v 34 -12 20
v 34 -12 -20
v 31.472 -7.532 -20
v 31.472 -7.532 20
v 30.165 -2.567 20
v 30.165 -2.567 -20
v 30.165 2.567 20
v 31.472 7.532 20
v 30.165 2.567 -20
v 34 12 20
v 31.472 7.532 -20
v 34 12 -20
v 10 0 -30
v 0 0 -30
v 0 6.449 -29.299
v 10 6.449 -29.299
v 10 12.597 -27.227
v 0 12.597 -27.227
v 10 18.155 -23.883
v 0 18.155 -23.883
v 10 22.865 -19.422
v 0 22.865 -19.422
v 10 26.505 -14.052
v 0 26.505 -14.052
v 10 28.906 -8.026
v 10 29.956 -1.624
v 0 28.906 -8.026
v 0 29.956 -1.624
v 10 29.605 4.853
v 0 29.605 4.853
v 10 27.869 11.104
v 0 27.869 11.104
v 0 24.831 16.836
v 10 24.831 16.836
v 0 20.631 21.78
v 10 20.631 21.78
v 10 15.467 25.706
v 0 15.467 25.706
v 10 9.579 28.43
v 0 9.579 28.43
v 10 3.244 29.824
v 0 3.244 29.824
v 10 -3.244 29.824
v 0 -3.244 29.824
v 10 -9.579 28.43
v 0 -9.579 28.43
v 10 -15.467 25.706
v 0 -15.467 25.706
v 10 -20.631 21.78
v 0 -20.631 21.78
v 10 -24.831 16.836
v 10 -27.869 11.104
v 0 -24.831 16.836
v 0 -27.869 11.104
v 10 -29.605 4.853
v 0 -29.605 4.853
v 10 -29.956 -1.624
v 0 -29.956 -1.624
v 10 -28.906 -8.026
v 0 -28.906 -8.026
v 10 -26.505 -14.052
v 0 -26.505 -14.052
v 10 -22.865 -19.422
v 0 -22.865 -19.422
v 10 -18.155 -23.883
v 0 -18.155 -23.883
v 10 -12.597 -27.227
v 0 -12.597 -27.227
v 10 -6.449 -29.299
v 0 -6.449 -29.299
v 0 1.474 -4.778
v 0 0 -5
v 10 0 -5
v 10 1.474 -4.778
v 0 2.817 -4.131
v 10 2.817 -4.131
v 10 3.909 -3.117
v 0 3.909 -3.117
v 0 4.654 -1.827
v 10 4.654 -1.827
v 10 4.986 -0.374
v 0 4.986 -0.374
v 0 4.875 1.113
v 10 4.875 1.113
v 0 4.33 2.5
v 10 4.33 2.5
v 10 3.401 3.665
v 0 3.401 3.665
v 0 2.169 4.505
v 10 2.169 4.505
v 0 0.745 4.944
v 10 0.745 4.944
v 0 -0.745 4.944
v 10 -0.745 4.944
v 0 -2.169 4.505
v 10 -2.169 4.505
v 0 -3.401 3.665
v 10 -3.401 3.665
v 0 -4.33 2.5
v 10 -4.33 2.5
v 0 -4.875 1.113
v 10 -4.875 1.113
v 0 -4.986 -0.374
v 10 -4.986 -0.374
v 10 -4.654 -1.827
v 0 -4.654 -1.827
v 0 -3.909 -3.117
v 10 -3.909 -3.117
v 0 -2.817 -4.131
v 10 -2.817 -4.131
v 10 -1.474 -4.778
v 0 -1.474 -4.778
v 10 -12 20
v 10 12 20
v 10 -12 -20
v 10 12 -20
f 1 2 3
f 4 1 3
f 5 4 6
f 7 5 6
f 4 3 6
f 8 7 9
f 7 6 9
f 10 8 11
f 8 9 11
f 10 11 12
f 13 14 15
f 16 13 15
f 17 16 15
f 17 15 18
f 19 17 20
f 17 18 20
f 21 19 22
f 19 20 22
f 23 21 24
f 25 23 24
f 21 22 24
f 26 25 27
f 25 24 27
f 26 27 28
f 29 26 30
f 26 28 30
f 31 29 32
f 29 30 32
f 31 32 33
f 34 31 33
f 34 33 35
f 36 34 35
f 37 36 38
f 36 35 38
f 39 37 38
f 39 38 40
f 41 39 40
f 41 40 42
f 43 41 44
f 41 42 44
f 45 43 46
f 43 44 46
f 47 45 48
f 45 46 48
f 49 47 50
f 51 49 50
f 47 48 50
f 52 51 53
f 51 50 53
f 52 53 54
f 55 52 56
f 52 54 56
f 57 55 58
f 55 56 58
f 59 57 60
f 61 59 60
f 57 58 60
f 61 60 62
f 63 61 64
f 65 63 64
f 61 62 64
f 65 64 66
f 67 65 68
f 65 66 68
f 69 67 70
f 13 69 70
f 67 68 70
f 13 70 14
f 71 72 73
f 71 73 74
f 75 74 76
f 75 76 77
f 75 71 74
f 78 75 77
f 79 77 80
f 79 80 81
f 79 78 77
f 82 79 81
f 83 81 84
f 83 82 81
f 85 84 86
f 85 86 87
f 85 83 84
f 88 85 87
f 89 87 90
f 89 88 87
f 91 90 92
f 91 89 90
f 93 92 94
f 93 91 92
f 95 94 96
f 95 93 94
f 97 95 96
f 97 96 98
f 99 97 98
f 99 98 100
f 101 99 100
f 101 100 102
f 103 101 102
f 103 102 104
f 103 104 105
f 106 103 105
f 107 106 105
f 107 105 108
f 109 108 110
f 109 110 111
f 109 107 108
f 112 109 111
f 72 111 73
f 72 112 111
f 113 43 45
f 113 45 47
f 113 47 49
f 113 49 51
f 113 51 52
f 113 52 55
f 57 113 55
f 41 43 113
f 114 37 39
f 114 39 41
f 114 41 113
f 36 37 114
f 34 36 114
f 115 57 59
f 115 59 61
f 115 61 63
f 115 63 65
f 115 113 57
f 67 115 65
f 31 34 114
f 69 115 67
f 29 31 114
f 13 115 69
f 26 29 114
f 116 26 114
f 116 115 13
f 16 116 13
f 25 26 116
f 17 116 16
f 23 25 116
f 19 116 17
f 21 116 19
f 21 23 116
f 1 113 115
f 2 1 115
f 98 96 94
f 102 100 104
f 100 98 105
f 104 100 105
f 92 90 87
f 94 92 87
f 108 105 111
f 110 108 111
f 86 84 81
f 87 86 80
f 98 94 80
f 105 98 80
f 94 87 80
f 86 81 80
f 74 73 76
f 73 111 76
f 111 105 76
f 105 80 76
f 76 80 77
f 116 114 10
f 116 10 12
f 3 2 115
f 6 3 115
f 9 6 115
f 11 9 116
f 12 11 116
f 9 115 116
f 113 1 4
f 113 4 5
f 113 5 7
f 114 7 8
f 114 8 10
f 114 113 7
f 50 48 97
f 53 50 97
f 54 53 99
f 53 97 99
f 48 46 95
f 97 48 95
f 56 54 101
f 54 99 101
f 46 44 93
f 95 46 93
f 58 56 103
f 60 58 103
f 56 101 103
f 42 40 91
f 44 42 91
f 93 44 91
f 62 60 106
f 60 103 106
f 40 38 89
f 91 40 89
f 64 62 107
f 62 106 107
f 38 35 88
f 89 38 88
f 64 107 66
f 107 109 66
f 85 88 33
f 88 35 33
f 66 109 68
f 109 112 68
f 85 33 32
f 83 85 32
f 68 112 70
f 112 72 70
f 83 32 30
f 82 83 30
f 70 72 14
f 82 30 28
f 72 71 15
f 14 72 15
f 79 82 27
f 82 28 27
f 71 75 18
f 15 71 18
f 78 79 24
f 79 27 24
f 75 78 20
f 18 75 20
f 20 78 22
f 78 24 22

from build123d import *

# Parameters (mm, degrees)
SKETCH_1_R          = 30
SKETCH_1_R_2        = 5
EXTRUDE_1_DEPTH     = 10
SKETCH_3_W          = 40
SKETCH_3_H          = 24
EXTRUDE_2_DEPTH     = 30
SKETCH_4_R          = 20
CUT_EXTRUDE_2_DEPTH = 71.710678119


with BuildPart() as part:
    # 草图1 → 凸台-拉伸1 (new body)
    with BuildSketch(Plane(origin=(0, 0, 0), x_dir=(0, 0, -1), z_dir=(1, 0, 0))):
        Circle(SKETCH_1_R)
        Circle(SKETCH_1_R_2, mode=Mode.SUBTRACT)
    extrude(amount=EXTRUDE_1_DEPTH)

    # 草图3 → 凸台-拉伸2 (add)
    with BuildSketch(Plane(origin=(10, 0, 0), x_dir=(0, 0, -1), z_dir=(1, 0, 0))):
        Rectangle(SKETCH_3_W, SKETCH_3_H)
    extrude(amount=EXTRUDE_2_DEPTH)

    # 草图4 → 切除-拉伸2 (cut, through all)
    with BuildSketch(Plane(origin=(0, 0, -20), x_dir=(-1, 0, 0), z_dir=(0, 0, -1))):
        with Locations((-50, 0)):
            Circle(SKETCH_4_R)
    extrude(amount=-CUT_EXTRUDE_2_DEPTH, mode=Mode.SUBTRACT)


solid = part.part
